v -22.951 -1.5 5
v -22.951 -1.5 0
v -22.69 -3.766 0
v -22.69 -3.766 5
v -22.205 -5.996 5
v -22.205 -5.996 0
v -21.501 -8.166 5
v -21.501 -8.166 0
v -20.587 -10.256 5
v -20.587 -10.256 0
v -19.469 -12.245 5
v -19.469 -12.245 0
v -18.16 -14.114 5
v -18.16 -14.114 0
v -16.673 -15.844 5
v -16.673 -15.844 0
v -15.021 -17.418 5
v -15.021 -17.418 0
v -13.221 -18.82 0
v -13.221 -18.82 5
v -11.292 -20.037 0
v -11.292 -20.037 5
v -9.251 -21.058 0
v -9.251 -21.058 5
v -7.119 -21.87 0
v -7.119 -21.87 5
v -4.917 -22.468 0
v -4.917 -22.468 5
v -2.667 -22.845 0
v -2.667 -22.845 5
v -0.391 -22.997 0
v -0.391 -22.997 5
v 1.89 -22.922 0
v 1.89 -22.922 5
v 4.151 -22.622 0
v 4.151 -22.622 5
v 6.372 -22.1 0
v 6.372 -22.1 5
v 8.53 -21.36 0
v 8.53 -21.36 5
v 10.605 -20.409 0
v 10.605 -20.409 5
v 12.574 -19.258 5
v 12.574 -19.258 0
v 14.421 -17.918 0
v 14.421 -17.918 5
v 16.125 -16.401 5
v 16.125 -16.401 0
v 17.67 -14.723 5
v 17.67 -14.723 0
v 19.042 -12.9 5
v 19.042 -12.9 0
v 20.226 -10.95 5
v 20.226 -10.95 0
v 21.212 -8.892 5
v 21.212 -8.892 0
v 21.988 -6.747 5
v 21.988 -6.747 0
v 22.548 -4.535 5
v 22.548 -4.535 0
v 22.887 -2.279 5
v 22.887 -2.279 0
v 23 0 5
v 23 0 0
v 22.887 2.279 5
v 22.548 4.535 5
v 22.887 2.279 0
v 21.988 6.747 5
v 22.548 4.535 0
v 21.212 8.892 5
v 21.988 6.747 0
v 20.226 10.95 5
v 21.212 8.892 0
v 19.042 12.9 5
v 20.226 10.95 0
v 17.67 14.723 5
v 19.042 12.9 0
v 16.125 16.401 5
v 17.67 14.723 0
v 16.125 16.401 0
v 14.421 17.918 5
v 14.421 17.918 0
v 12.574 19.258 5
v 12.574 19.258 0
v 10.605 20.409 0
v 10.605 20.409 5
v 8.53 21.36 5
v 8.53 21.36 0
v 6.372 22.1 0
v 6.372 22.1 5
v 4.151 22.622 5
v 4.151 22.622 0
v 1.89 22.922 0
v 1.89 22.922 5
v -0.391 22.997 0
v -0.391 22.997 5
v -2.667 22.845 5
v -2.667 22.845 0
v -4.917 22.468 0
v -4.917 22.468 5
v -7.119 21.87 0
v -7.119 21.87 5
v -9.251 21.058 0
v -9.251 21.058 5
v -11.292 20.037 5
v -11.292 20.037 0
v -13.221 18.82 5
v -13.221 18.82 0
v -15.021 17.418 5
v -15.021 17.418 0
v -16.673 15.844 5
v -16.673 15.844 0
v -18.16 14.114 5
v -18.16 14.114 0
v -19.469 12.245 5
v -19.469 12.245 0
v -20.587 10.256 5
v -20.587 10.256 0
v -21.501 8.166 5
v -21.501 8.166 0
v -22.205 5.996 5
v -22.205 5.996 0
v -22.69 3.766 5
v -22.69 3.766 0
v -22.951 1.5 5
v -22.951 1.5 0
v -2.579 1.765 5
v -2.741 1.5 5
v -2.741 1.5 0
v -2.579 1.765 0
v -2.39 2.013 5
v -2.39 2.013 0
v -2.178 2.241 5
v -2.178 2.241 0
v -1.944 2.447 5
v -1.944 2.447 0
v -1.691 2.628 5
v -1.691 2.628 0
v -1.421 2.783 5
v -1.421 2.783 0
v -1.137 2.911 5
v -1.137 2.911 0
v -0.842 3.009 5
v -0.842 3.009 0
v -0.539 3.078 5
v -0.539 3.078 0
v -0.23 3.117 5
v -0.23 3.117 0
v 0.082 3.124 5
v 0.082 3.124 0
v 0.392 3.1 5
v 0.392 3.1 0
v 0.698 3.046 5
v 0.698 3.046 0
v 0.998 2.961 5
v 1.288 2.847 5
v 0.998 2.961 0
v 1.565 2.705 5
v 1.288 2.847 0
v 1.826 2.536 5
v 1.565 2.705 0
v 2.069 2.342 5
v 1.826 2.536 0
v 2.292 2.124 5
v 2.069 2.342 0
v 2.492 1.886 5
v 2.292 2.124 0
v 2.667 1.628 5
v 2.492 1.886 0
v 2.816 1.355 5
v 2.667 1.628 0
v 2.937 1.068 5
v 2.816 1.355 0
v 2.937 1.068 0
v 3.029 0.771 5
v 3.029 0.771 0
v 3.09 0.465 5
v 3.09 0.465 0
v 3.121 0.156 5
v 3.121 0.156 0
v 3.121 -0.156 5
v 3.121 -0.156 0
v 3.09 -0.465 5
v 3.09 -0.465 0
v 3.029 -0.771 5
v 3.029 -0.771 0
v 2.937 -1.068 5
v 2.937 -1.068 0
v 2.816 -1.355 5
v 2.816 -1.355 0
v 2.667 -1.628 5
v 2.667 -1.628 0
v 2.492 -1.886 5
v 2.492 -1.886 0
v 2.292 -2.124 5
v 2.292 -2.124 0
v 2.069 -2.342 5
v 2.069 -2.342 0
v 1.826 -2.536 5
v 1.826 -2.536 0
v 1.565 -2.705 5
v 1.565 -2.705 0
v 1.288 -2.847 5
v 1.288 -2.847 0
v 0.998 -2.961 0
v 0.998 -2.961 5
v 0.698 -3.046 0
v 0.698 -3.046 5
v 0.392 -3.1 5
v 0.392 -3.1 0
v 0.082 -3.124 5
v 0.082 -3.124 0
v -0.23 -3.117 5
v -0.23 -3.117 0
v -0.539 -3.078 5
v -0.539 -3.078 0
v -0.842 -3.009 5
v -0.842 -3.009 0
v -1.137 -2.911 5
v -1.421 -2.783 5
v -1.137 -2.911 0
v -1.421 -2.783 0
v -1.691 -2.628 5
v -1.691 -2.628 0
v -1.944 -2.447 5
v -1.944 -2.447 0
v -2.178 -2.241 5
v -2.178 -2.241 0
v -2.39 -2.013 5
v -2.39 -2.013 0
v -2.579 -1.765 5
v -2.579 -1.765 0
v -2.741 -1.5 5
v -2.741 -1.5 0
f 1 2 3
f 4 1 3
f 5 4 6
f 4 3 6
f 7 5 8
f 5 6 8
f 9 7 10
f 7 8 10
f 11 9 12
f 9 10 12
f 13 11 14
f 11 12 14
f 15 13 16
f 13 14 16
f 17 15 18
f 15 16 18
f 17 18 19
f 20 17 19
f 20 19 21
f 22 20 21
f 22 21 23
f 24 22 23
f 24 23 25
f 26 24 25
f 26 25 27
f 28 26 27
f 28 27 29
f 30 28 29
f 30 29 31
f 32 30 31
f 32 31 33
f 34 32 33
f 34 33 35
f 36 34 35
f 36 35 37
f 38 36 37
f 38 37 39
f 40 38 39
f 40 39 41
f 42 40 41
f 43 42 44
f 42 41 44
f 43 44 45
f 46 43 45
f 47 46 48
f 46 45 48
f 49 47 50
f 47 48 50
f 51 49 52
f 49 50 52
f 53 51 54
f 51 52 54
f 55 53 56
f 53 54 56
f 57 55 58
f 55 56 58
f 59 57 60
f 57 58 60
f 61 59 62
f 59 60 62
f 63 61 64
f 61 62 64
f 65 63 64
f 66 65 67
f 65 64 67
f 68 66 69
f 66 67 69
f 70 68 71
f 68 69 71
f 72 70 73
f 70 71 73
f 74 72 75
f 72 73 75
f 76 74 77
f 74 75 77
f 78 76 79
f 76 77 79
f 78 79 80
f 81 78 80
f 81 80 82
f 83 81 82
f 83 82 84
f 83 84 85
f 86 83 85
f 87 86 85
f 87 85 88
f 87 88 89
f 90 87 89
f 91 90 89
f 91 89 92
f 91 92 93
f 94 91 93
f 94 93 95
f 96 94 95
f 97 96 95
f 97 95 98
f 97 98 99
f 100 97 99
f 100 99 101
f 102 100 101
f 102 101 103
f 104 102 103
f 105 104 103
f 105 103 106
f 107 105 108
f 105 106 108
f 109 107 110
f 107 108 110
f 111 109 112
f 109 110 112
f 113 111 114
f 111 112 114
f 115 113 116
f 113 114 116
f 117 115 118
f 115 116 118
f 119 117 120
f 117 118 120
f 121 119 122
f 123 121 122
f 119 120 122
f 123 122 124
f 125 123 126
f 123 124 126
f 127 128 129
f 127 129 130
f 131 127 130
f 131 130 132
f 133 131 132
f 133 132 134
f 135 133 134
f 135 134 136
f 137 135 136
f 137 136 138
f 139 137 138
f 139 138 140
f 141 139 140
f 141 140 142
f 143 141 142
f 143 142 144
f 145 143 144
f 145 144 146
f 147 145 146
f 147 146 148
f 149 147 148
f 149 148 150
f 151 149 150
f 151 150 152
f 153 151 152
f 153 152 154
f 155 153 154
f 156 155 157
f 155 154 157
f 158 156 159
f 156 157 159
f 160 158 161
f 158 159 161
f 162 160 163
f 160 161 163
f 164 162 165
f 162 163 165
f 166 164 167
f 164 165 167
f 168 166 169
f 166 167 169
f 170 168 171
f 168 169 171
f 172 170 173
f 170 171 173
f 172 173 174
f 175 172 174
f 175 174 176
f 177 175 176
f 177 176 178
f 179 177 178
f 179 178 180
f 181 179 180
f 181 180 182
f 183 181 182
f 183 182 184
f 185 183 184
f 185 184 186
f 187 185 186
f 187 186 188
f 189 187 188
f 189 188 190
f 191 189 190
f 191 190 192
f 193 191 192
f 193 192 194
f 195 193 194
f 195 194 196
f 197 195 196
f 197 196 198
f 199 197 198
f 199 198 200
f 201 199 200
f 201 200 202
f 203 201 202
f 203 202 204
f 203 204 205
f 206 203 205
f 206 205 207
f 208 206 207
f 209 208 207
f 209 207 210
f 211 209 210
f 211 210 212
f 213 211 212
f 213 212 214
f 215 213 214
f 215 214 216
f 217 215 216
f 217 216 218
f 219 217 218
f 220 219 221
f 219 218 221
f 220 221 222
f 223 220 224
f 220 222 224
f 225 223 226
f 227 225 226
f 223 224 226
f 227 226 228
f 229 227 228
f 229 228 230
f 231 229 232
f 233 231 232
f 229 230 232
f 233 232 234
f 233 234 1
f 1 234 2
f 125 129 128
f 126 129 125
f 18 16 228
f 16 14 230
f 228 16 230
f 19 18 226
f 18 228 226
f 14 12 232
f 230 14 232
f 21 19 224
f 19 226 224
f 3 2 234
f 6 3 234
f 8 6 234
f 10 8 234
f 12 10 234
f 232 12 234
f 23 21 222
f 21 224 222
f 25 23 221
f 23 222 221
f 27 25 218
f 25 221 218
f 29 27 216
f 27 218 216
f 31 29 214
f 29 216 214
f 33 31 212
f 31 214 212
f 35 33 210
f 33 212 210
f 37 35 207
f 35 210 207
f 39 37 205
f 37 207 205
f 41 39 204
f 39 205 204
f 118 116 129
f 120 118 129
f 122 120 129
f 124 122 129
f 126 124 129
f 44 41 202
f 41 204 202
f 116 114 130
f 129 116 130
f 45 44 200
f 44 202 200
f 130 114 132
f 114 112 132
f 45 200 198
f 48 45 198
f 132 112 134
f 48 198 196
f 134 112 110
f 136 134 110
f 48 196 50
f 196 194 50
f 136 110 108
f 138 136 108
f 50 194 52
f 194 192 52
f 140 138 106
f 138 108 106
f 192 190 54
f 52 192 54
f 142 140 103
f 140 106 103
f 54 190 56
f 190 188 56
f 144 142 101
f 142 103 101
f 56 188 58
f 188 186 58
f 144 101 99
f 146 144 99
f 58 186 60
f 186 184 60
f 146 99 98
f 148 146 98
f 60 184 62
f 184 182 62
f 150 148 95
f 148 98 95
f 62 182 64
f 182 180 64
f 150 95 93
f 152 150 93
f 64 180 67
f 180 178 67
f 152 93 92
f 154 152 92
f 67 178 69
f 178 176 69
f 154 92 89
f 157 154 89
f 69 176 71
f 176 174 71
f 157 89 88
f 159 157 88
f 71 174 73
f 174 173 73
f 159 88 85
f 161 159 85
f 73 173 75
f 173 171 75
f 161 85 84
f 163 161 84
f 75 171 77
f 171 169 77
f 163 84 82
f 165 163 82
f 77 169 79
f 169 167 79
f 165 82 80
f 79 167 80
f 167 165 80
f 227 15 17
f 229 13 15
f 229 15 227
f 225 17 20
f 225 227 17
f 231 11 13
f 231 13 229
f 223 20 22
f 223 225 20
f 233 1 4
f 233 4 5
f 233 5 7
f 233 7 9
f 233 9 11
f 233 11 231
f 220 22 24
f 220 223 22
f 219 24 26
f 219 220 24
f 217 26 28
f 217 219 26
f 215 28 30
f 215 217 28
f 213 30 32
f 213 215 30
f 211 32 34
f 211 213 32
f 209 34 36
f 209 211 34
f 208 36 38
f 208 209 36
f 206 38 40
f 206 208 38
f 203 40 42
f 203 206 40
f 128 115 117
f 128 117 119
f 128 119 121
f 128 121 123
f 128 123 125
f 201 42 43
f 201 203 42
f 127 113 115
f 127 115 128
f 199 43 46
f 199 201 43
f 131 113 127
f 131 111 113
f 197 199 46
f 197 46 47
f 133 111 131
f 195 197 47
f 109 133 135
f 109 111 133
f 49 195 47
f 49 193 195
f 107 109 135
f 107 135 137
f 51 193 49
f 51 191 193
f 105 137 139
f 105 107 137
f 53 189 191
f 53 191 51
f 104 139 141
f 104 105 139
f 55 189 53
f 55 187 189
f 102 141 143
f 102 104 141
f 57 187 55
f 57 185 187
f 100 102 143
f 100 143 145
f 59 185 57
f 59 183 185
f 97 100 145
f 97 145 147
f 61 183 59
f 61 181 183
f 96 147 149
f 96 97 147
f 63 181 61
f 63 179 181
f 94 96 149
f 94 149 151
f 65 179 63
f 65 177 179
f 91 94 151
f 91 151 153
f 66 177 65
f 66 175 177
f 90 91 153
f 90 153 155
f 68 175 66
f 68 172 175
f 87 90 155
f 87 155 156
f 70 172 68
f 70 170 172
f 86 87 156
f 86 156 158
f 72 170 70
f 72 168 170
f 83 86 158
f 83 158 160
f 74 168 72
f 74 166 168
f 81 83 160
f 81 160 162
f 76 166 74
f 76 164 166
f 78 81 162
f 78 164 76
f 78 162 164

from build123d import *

# Parameters (mm, degrees)
SKETCH1_R           = 23
BOSS_EXTRUDE1_DEPTH = 5
SKETCH2_R           = 3.125
CUT_EXTRUDE1_DEPTH  = 6
SKETCH4_W           = 22.031580043
SKETCH4_H           = 3
CUT_EXTRUDE2_DEPTH  = 6


with BuildPart() as part:
    # Sketch1 → Boss-Extrude1 (new body)
    with BuildSketch(Plane.XY):
        Circle(SKETCH1_R)
    extrude(amount=BOSS_EXTRUDE1_DEPTH)

    # Sketch2 → Cut-Extrude1 (cut, through all)
    with BuildSketch(Plane(origin=(0, 0, 0), x_dir=(-1, 0, 0), z_dir=(0, 0, -1))):
        Circle(SKETCH2_R)
    extrude(amount=-CUT_EXTRUDE1_DEPTH, mode=Mode.SUBTRACT)

    # Sketch4 → Cut-Extrude2 (cut, through all)
    with BuildSketch(Plane(origin=(0, 0, 0), x_dir=(-1, 0, 0), z_dir=(0, 0, -1))):
        with Locations((13.757254046, 0)):
            Rectangle(SKETCH4_W, SKETCH4_H)
    extrude(amount=-CUT_EXTRUDE2_DEPTH, mode=Mode.SUBTRACT)


solid = part.part
